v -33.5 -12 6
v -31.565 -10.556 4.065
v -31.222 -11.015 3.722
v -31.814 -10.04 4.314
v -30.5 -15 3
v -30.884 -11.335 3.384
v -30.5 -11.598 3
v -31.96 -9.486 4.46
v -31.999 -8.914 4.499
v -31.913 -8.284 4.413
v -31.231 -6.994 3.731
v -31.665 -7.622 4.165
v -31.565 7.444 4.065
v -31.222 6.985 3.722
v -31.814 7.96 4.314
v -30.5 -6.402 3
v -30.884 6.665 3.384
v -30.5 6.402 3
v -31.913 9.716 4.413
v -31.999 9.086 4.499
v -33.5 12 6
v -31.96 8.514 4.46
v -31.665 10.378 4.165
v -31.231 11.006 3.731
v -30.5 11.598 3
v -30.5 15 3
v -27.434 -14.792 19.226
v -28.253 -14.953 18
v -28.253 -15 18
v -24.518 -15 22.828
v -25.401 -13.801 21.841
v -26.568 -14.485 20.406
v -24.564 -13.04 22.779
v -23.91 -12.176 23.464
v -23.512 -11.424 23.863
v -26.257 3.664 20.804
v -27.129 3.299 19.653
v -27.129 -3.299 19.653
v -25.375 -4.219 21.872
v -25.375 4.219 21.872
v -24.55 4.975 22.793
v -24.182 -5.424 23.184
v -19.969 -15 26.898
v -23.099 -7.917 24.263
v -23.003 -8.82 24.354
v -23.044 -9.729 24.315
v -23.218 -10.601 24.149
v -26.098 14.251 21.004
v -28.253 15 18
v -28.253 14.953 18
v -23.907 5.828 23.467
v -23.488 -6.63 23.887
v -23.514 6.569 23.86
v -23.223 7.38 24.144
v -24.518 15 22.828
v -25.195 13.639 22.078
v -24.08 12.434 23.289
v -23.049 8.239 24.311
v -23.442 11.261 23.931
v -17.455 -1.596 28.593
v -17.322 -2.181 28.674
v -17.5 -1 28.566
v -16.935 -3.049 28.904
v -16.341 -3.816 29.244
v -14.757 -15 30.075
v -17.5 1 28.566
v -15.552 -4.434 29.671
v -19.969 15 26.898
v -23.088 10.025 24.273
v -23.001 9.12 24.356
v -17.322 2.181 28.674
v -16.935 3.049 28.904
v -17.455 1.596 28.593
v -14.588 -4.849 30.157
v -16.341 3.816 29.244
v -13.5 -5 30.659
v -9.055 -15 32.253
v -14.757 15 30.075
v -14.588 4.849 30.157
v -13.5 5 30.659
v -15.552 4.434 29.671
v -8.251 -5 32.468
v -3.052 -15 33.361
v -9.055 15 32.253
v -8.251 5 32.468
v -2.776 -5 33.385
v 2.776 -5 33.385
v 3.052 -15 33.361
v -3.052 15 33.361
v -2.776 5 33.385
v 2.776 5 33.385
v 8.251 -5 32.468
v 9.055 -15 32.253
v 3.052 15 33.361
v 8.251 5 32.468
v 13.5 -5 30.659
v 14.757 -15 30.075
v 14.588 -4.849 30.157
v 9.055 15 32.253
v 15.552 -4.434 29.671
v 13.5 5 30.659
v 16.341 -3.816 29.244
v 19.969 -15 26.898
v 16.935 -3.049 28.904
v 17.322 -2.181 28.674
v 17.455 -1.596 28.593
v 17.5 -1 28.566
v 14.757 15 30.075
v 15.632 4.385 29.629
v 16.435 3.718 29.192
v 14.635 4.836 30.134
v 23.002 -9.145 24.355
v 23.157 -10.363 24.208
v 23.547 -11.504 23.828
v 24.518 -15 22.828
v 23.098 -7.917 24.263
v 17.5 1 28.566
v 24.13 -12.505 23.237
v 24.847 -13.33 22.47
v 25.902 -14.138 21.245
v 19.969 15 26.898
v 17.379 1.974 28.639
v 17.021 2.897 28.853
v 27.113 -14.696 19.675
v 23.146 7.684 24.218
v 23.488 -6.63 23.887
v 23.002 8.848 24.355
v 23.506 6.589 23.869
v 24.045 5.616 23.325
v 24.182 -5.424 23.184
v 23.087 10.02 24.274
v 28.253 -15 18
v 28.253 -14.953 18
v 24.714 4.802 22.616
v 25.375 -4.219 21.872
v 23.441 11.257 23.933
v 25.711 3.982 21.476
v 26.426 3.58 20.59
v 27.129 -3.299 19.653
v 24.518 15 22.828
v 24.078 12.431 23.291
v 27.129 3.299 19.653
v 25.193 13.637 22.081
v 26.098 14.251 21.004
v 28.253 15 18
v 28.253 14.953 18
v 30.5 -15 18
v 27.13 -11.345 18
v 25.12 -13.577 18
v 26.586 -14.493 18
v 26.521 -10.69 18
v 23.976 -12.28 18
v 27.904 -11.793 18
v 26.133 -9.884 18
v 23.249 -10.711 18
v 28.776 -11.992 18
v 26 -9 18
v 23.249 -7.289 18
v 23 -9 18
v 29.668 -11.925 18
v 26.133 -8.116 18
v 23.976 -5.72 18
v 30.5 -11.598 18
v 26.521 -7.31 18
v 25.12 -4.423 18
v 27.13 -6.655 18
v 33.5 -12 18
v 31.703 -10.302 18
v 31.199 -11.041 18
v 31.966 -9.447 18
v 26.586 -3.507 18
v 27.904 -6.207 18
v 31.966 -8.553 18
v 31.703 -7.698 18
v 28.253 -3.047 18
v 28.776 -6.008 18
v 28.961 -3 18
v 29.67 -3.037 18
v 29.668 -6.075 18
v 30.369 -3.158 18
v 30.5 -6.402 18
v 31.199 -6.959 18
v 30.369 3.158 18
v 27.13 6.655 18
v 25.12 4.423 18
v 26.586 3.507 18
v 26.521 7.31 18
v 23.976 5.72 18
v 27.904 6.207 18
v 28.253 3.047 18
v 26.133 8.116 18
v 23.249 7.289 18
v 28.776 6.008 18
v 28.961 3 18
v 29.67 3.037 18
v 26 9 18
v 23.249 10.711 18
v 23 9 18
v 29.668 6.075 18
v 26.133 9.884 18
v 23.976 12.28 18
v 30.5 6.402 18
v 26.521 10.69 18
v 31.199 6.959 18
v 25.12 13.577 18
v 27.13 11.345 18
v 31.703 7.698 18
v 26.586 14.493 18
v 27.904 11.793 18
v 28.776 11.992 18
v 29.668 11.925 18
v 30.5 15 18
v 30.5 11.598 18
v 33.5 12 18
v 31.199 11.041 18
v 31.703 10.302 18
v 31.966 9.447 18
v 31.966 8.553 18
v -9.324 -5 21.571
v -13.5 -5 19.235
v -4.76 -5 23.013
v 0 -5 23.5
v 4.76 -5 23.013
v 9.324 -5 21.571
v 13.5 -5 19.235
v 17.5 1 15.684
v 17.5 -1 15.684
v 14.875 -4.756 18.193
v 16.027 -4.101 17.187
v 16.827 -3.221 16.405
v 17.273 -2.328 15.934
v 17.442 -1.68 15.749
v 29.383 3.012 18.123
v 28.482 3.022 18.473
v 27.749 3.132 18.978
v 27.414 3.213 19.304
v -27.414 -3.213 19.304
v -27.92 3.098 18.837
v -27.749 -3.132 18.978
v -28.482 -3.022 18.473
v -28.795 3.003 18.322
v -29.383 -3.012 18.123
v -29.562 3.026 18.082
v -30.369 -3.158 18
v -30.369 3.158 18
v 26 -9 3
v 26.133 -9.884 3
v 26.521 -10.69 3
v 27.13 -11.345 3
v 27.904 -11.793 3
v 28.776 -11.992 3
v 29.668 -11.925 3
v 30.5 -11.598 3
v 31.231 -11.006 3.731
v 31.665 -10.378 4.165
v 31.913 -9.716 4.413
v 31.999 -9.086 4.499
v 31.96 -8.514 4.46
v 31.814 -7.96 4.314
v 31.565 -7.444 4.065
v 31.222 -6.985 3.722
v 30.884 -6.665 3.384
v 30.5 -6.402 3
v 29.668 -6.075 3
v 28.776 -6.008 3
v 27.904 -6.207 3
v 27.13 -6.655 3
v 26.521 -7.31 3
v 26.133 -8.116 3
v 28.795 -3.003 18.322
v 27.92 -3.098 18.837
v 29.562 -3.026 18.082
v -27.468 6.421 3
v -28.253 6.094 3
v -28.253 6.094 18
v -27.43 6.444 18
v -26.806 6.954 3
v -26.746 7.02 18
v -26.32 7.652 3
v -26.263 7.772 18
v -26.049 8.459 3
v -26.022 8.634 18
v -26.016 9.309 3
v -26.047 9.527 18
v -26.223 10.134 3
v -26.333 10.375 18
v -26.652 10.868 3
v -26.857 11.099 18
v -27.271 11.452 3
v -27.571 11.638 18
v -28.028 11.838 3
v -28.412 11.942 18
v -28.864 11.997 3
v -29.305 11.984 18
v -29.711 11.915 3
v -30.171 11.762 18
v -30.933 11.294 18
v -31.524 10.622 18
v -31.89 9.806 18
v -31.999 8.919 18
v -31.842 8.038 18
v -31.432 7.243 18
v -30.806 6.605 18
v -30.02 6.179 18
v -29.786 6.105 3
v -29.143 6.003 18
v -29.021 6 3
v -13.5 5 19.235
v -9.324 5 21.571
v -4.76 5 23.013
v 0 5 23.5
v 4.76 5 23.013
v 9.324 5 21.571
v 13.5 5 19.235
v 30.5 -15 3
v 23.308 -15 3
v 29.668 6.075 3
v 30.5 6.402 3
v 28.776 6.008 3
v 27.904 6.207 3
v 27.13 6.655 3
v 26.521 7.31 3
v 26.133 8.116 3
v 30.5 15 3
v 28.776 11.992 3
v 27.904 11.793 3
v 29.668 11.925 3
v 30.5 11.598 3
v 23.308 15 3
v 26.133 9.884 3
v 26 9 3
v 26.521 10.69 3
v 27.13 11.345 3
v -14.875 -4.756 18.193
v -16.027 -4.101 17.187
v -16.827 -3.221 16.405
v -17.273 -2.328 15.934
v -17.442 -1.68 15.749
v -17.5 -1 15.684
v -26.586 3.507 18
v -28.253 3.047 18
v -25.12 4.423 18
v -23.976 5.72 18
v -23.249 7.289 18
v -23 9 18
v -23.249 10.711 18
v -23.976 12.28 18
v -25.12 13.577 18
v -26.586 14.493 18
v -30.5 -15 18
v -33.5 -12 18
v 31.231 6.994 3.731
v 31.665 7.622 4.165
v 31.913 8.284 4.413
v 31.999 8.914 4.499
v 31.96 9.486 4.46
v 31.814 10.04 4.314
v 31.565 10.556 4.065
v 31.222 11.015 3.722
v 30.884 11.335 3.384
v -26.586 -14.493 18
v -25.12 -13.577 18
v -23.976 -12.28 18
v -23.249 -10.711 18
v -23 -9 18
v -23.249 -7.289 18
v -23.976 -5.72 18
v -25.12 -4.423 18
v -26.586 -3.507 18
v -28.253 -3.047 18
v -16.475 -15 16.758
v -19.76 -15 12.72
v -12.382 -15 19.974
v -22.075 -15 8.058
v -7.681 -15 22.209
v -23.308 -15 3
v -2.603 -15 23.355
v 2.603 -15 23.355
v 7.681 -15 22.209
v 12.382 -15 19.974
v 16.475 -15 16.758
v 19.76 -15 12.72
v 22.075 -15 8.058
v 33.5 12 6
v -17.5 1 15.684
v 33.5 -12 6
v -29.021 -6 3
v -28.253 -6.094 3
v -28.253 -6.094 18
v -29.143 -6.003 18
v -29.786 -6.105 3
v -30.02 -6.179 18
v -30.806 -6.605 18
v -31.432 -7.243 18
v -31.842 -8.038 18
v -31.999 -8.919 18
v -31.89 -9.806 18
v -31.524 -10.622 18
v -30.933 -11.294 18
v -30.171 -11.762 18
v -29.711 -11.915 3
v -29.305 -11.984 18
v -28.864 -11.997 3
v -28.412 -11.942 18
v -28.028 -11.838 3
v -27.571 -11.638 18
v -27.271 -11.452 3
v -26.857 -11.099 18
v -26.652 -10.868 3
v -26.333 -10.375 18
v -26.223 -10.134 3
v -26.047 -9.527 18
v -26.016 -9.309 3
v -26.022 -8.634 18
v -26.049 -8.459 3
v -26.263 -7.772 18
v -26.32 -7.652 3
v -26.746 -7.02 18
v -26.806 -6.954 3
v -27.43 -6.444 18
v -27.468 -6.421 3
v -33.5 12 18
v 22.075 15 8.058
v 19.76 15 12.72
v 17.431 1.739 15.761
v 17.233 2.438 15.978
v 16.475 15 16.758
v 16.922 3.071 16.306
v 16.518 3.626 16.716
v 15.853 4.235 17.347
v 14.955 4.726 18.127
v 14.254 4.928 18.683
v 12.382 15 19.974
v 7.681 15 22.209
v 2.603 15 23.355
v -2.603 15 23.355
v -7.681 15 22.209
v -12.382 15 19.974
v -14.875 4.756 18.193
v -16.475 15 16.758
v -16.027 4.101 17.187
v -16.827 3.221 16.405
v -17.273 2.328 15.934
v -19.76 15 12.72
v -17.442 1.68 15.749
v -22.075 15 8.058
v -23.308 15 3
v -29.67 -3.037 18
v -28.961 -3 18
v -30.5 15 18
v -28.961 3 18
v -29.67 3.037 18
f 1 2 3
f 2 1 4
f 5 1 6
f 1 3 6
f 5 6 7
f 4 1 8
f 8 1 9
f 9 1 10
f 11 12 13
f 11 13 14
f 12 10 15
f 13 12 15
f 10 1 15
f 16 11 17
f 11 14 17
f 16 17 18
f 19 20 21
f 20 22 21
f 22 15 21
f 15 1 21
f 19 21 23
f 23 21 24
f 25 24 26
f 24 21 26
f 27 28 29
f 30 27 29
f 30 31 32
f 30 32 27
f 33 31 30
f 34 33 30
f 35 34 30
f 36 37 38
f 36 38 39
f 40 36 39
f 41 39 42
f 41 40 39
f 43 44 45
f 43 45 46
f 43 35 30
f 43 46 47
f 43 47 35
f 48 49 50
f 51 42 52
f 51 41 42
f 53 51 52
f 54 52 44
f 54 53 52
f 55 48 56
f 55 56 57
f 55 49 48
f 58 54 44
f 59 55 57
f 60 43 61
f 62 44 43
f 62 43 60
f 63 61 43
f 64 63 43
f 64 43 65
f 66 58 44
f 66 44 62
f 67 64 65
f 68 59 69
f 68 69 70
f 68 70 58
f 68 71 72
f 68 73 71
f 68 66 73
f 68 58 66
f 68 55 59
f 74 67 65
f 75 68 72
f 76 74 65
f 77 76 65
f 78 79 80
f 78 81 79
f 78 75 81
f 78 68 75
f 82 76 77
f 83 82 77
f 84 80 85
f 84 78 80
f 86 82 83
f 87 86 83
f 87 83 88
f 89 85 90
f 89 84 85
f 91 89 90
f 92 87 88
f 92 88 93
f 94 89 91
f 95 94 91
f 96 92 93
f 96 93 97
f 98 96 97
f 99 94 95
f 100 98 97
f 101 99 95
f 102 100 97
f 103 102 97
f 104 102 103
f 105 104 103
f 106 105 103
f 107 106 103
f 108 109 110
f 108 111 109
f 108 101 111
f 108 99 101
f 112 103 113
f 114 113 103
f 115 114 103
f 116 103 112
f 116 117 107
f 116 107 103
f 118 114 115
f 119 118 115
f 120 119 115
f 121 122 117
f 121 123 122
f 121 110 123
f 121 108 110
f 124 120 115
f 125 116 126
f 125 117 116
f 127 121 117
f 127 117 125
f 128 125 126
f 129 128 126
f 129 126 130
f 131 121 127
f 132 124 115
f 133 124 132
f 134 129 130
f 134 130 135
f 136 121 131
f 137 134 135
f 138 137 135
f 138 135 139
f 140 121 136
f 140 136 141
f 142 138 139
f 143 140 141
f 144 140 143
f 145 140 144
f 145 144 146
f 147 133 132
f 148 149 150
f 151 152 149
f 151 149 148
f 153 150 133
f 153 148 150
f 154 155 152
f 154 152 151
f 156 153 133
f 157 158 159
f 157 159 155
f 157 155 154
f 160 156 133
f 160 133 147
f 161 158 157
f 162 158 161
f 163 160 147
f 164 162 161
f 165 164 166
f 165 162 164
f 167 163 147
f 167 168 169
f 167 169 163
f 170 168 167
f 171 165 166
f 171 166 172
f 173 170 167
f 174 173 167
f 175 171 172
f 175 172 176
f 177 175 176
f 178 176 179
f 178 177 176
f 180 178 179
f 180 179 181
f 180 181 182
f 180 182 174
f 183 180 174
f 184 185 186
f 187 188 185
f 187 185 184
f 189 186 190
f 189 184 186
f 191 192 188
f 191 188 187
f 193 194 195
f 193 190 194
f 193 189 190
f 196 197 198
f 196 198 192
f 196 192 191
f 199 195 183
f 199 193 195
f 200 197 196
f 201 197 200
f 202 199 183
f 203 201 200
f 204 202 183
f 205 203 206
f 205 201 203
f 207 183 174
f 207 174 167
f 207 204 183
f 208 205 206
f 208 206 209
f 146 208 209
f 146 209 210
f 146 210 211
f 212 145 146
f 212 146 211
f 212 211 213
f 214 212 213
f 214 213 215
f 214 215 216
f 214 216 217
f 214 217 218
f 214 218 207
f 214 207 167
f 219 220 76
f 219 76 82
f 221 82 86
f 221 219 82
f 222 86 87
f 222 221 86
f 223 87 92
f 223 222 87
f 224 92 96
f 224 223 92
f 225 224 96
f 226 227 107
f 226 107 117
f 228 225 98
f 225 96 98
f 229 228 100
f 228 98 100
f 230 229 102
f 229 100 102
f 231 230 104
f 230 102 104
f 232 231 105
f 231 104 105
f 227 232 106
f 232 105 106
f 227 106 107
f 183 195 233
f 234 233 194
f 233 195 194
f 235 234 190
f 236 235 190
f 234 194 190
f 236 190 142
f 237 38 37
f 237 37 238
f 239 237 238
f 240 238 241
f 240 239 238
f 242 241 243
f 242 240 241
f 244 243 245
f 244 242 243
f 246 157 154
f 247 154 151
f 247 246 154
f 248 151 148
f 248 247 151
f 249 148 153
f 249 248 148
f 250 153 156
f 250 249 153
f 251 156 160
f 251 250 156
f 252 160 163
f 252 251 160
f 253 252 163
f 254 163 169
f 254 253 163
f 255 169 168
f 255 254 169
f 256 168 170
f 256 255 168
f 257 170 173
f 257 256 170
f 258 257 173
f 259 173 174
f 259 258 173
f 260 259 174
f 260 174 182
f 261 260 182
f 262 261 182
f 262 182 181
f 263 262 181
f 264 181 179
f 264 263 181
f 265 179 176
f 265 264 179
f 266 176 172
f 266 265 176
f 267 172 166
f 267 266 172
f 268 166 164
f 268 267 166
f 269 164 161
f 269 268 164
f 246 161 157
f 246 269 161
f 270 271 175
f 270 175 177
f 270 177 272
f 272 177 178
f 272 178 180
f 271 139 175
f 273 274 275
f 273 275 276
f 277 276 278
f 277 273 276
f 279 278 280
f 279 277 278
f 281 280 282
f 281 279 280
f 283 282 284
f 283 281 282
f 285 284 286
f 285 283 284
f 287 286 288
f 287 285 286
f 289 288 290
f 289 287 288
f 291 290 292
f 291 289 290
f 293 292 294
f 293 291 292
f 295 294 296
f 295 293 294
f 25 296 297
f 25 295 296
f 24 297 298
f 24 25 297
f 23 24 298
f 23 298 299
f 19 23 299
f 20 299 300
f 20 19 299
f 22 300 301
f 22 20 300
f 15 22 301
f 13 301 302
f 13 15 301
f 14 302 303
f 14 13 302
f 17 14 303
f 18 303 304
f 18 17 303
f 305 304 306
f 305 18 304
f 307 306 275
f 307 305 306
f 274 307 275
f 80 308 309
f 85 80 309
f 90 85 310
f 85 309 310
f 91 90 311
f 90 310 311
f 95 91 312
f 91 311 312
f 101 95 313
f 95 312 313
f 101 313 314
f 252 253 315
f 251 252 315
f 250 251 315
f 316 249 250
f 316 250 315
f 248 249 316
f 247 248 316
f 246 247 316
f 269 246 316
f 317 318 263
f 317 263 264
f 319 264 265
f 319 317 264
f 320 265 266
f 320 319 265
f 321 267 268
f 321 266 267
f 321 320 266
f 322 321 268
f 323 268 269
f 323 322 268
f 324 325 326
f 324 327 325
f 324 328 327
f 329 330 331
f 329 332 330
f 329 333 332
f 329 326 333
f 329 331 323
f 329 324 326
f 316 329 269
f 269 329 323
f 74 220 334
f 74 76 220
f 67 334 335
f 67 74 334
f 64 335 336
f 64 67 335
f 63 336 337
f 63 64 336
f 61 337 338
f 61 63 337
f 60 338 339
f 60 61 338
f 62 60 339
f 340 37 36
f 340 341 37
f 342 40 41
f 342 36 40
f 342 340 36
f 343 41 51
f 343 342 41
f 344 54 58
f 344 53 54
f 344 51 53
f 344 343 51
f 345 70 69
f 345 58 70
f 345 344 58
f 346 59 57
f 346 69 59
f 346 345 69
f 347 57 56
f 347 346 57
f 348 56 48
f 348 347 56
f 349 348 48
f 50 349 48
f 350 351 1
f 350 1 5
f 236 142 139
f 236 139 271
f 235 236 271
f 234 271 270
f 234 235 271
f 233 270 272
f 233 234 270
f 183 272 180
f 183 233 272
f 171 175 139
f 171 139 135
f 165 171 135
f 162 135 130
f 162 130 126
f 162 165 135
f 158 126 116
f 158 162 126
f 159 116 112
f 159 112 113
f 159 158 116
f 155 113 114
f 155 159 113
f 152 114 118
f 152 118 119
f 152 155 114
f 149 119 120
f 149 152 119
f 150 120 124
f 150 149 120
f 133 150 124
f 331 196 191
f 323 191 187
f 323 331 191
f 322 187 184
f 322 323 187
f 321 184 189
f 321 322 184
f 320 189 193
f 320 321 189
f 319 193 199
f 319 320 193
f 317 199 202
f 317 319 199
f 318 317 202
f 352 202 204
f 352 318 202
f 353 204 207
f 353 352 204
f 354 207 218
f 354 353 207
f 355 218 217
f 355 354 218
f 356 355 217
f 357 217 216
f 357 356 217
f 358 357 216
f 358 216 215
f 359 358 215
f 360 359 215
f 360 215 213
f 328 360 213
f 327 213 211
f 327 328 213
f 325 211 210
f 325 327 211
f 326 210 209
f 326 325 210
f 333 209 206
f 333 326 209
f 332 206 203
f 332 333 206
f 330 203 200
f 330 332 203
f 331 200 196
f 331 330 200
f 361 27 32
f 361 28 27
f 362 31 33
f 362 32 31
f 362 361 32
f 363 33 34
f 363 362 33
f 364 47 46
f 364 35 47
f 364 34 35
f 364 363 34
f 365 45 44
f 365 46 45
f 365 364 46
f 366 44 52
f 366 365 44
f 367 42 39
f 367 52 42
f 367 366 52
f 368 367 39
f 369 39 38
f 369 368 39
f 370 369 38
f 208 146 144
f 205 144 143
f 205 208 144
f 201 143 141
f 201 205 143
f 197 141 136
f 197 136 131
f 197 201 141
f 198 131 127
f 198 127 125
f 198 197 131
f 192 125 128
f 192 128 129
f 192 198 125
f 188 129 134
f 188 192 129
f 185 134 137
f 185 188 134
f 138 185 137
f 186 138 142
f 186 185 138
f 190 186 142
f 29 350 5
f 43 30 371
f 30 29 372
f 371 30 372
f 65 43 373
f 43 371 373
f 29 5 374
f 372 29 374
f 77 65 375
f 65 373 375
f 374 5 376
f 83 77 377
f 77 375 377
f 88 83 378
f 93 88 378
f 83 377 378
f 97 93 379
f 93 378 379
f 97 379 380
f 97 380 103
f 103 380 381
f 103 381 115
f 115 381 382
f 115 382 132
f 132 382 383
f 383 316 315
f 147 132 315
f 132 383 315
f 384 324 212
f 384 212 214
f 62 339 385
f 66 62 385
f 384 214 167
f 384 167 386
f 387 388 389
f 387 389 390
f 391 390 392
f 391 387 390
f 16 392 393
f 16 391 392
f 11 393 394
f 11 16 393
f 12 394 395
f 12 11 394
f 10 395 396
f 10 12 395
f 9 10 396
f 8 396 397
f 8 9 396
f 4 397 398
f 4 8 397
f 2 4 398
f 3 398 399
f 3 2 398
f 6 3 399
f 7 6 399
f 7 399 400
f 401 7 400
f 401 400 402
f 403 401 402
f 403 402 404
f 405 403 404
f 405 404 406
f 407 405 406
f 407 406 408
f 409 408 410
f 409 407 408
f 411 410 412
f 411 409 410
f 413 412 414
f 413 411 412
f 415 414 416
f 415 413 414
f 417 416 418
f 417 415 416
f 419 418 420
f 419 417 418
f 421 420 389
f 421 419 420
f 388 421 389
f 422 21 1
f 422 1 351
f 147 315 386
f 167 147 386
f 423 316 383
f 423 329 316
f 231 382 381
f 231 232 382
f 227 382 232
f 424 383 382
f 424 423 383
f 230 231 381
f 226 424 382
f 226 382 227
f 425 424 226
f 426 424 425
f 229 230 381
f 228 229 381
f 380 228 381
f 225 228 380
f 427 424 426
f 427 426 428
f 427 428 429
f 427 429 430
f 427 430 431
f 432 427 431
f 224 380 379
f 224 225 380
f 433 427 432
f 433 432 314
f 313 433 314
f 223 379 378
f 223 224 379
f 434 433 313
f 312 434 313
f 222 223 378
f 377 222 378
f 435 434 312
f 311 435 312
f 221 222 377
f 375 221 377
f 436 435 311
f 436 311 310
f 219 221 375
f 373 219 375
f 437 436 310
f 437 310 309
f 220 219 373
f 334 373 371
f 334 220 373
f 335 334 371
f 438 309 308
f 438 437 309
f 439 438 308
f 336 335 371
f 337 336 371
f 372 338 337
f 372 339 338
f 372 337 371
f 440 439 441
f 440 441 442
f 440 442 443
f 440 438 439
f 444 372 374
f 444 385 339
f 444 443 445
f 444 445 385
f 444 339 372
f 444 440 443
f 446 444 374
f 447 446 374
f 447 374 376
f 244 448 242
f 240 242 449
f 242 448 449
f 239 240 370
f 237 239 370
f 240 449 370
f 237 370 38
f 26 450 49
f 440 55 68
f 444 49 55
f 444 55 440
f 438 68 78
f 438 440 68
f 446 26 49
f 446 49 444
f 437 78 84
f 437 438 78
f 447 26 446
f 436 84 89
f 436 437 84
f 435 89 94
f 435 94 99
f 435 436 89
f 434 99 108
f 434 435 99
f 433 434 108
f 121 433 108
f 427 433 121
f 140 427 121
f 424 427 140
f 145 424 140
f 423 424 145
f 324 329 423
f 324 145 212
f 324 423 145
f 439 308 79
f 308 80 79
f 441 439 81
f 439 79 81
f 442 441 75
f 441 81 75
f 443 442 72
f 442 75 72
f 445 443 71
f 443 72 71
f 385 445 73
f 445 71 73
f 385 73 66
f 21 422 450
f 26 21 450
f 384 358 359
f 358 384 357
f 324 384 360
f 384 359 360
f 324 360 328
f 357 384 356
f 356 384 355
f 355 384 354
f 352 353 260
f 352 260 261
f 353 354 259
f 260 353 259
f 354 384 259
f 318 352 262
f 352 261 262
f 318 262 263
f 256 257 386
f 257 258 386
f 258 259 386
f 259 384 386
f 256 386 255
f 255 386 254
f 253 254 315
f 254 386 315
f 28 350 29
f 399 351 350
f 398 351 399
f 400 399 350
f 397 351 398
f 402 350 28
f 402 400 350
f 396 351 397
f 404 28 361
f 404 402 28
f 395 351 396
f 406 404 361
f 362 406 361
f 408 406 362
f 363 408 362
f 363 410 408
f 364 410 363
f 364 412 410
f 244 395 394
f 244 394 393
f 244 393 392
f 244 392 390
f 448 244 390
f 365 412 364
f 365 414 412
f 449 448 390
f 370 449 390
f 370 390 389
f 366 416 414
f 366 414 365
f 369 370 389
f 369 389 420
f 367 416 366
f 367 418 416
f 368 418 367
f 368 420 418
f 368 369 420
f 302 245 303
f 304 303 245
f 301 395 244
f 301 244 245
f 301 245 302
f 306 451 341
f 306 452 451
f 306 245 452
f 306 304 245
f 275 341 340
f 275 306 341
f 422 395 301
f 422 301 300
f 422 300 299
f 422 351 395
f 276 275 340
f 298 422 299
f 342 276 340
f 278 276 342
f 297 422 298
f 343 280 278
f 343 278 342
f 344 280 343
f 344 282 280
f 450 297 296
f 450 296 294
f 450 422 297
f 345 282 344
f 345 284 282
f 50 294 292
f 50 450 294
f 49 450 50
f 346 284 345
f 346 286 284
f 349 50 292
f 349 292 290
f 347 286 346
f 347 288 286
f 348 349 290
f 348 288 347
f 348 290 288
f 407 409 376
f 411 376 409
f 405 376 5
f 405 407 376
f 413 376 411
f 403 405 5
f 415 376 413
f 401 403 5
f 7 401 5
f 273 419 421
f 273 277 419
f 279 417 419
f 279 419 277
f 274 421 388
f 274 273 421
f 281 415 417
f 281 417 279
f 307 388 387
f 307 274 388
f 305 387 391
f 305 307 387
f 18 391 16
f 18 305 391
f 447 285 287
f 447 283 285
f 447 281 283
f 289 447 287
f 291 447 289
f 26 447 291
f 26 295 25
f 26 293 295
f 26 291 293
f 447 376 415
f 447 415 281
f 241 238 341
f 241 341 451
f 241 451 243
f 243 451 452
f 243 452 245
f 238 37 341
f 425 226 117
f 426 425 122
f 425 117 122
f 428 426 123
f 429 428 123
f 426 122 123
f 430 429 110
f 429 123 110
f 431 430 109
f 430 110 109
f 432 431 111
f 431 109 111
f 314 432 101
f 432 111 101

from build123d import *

# Parameters (mm, degrees)
BOSS_EXTRUDE1_DEPTH = 15
SKETCH2_R           = 3
CUT_EXTRUDE1_DEPTH  = 30
SKETCH3_W           = 35
SKETCH3_H           = 10
CUT_EXTRUDE2_DEPTH  = 50.694064129
FILLET1_R           = 4
SKETCH4_R           = 6
CUT_EXTRUDE3_DEPTH  = 30
FILLET2_R           = 4
CHAMFER1_SIZE       = 3


with BuildPart() as part:
    # Sketch1 → Boss-Extrude1 (new, symmetric)
    with BuildSketch(Plane(origin=(0, 0, 0), x_dir=(1, 0, 0), z_dir=(0, 1, 0))):
        with BuildLine():
            ThreePointArc((-28.253318389, -18), (-31.709094157, -10.806634433), (-33.365401241, -3))
            Line((-33.365401241, -3), (-33.5, -3))
            Line((-33.5, -3), (-33.5, -18))
            Line((-33.5, -18), (-28.253318389, -18))
        make_face()
        with BuildLine():
            Line((33.365401241, -3), (23.307724042, -3))
            ThreePointArc((23.307724042, -3), (0, -23.5), (-23.307724042, -3))
            Line((-23.307724042, -3), (-33.365401241, -3))
            ThreePointArc((-33.365401241, -3), (-31.709094157, -10.806634433), (-28.253318389, -18))
            ThreePointArc((-28.253318389, -18), (0, -33.5), (28.253318389, -18))
            ThreePointArc((28.253318389, -18), (31.709094157, -10.806634433), (33.365401241, -3))
        make_face()
        with BuildLine():
            Line((33.5, -3), (33.365401241, -3))
            ThreePointArc((33.365401241, -3), (31.709094157, -10.806634433), (28.253318389, -18))
            Line((28.253318389, -18), (33.5, -18))
            Line((33.5, -18), (33.5, -3))
        make_face()
    extrude(amount=BOSS_EXTRUDE1_DEPTH, both=True)

    # Sketch2 → Cut-Extrude1 (cut)
    with BuildSketch(Plane.XY):
        with Locations(Location((29, -9, 0), (0, 0, 180))):
            Circle(SKETCH2_R)
        with Locations(Location((29, 9, 0), (0, 0, 180))):
            Circle(SKETCH2_R)
        with Locations(Location((-29, 9, 0), (0, 0, 284.412066788))):
            Circle(SKETCH2_R)
        with Locations(Location((-29, -9, 0), (0, 0, 75.587933212))):
            Circle(SKETCH2_R)
    extrude(amount=CUT_EXTRUDE1_DEPTH, mode=Mode.SUBTRACT)

    # Sketch3 → Cut-Extrude2 (cut, through all)
    with BuildSketch(Plane.XY):
        Rectangle(SKETCH3_W, SKETCH3_H)
    extrude(amount=CUT_EXTRUDE2_DEPTH, mode=Mode.SUBTRACT)

    # Fillet1
    fillet1_edges = [part.edges().sort_by_distance(p)[0] for p in [
        (17.5, -5, 22.125050428),
        (17.5, 5, 22.125050428),
        (-17.5, 5, 22.125050428),
        (-17.5, -5, 22.125050428),
    ]]
    fillet(fillet1_edges, radius=FILLET1_R)

    # Sketch4 → Cut-Extrude3 (cut)
    with BuildSketch(Plane.XY.offset(18)):
        with Locations((29, 9)):
            Circle(SKETCH4_R)
        with Locations((29, -9)):
            Circle(SKETCH4_R)
        with Locations((-29, -9)):
            Circle(SKETCH4_R)
        with Locations((-29, 9)):
            Circle(SKETCH4_R)
    extrude(amount=CUT_EXTRUDE3_DEPTH, mode=Mode.SUBTRACT)

    # Fillet2
    # the kernel refuses this fillet: 4 mm, written as the material it adds along each edge
    with BuildSketch(Plane(origin=(28.253318389, 8.334769634, 18), x_dir=(1, 0, 0), z_dir=(0, -1, 0))) as fillet2_piece_1_section:
        with BuildLine():
            CenterArc((2.115250889, 4), FILLET2_R, 215.920819838, 54.079180162)
            ThreePointArc((-1.124063167, 1.653333333), (-0.549695111, 0.835053949), (0, 0))
            Line((0, 0), (2.115250889, 0))
        make_face()
    fillet2_piece_1 = extrude(amount=16.669539268, mode=Mode.PRIVATE)
    fillet2_piece_1 = fillet2_piece_1 - Plane(origin=(29, 9, 18.362807828), x_dir=(1, 0, 0), z_dir=(0, 0, -1)) * Cylinder(6, 42, mode=Mode.PRIVATE)
    fillet2_piece_1 = fillet2_piece_1 - Plane(origin=(29, -9, 18.362807828), x_dir=(1, 0, 0), z_dir=(0, 0, -1)) * Cylinder(6, 42, mode=Mode.PRIVATE)
    add(fillet2_piece_1)
    with BuildSketch(Plane(origin=(-28.253318389, -8.334769634, 18), x_dir=(-1, 0, 0), z_dir=(0, 1, 0))) as fillet2_piece_2_section:
        with BuildLine():
            CenterArc((2.115250889, 4), FILLET2_R, 215.920819838, 54.079180162)
            ThreePointArc((-1.124063167, 1.653333333), (-0.549695111, 0.835053949), (0, 0))
            Line((0, 0), (2.115250889, 0))
        make_face()
    fillet2_piece_2 = extrude(amount=16.669539268, mode=Mode.PRIVATE)
    fillet2_piece_2 = fillet2_piece_2 - Plane(origin=(-29, -9, 18.362807828), x_dir=(1, 0, 0), z_dir=(0, 0, -1)) * Cylinder(6, 42, mode=Mode.PRIVATE)
    fillet2_piece_2 = fillet2_piece_2 - Plane(origin=(-29, 9, 18.362807828), x_dir=(1, 0, 0), z_dir=(0, 0, -1)) * Cylinder(6, 42, mode=Mode.PRIVATE)
    add(fillet2_piece_2)

    # Chamfer1
    # the kernel refuses this chamfer: 3 mm, written as the material it takes off along each edge
    with BuildSketch(Plane(origin=(33.5, -15, 25.715048964), x_dir=(-0.9996219169112968, -0.02749587661058619, 0), z_dir=(0, 0, -1)), Plane(origin=(-33.5, 15, -4.715048964), x_dir=(-0.02749587661058678, -0.9996219169112968, 0), z_dir=(0, 0, 1))) as chamfer1_piece_1:
        Polygon((CHAMFER1_SIZE * 0.999621916911, CHAMFER1_SIZE * 0.0274958766106), (-CHAMFER1_SIZE * 0.0274958766106, CHAMFER1_SIZE * 0.999621916911), (0, 0), align=None)
    extrude(amount=30.430097928, mode=Mode.SUBTRACT)
    with BuildSketch(Plane(origin=(-33.5, 22.715048964, 3), x_dir=(-0.02749587661058677, 0, 0.9996219169112968), z_dir=(0, -1, 0)), Plane(origin=(33.5, -22.715048964, 3), x_dir=(0.027495876610586757, 0, 0.9996219169112968), z_dir=(0, 1, 0))) as chamfer1_piece_2:
        Polygon((CHAMFER1_SIZE * 0.999621916911, -CHAMFER1_SIZE * 0.0274958766106), (-CHAMFER1_SIZE * 0.0274958766106, -CHAMFER1_SIZE * 0.999621916911), (0, 0), align=None)
    extrude(amount=45.430097928, mode=Mode.SUBTRACT)
    with BuildSketch(Plane(origin=(33.5, 15, 25.715048964), x_dir=(-0.9996219169112968, 0.02749587661058619, 0), z_dir=(0, 0, -1)), Plane(origin=(-33.5, -15, -4.715048964), x_dir=(-0.02749587661058678, 0.9996219169112968, 0), z_dir=(0, 0, 1))) as chamfer1_piece_3:
        Polygon((CHAMFER1_SIZE * 0.999621916911, -CHAMFER1_SIZE * 0.0274958766106), (-CHAMFER1_SIZE * 0.0274958766106, -CHAMFER1_SIZE * 0.999621916911), (0, 0), align=None)
    extrude(amount=30.430097928, mode=Mode.SUBTRACT)


solid = part.part
